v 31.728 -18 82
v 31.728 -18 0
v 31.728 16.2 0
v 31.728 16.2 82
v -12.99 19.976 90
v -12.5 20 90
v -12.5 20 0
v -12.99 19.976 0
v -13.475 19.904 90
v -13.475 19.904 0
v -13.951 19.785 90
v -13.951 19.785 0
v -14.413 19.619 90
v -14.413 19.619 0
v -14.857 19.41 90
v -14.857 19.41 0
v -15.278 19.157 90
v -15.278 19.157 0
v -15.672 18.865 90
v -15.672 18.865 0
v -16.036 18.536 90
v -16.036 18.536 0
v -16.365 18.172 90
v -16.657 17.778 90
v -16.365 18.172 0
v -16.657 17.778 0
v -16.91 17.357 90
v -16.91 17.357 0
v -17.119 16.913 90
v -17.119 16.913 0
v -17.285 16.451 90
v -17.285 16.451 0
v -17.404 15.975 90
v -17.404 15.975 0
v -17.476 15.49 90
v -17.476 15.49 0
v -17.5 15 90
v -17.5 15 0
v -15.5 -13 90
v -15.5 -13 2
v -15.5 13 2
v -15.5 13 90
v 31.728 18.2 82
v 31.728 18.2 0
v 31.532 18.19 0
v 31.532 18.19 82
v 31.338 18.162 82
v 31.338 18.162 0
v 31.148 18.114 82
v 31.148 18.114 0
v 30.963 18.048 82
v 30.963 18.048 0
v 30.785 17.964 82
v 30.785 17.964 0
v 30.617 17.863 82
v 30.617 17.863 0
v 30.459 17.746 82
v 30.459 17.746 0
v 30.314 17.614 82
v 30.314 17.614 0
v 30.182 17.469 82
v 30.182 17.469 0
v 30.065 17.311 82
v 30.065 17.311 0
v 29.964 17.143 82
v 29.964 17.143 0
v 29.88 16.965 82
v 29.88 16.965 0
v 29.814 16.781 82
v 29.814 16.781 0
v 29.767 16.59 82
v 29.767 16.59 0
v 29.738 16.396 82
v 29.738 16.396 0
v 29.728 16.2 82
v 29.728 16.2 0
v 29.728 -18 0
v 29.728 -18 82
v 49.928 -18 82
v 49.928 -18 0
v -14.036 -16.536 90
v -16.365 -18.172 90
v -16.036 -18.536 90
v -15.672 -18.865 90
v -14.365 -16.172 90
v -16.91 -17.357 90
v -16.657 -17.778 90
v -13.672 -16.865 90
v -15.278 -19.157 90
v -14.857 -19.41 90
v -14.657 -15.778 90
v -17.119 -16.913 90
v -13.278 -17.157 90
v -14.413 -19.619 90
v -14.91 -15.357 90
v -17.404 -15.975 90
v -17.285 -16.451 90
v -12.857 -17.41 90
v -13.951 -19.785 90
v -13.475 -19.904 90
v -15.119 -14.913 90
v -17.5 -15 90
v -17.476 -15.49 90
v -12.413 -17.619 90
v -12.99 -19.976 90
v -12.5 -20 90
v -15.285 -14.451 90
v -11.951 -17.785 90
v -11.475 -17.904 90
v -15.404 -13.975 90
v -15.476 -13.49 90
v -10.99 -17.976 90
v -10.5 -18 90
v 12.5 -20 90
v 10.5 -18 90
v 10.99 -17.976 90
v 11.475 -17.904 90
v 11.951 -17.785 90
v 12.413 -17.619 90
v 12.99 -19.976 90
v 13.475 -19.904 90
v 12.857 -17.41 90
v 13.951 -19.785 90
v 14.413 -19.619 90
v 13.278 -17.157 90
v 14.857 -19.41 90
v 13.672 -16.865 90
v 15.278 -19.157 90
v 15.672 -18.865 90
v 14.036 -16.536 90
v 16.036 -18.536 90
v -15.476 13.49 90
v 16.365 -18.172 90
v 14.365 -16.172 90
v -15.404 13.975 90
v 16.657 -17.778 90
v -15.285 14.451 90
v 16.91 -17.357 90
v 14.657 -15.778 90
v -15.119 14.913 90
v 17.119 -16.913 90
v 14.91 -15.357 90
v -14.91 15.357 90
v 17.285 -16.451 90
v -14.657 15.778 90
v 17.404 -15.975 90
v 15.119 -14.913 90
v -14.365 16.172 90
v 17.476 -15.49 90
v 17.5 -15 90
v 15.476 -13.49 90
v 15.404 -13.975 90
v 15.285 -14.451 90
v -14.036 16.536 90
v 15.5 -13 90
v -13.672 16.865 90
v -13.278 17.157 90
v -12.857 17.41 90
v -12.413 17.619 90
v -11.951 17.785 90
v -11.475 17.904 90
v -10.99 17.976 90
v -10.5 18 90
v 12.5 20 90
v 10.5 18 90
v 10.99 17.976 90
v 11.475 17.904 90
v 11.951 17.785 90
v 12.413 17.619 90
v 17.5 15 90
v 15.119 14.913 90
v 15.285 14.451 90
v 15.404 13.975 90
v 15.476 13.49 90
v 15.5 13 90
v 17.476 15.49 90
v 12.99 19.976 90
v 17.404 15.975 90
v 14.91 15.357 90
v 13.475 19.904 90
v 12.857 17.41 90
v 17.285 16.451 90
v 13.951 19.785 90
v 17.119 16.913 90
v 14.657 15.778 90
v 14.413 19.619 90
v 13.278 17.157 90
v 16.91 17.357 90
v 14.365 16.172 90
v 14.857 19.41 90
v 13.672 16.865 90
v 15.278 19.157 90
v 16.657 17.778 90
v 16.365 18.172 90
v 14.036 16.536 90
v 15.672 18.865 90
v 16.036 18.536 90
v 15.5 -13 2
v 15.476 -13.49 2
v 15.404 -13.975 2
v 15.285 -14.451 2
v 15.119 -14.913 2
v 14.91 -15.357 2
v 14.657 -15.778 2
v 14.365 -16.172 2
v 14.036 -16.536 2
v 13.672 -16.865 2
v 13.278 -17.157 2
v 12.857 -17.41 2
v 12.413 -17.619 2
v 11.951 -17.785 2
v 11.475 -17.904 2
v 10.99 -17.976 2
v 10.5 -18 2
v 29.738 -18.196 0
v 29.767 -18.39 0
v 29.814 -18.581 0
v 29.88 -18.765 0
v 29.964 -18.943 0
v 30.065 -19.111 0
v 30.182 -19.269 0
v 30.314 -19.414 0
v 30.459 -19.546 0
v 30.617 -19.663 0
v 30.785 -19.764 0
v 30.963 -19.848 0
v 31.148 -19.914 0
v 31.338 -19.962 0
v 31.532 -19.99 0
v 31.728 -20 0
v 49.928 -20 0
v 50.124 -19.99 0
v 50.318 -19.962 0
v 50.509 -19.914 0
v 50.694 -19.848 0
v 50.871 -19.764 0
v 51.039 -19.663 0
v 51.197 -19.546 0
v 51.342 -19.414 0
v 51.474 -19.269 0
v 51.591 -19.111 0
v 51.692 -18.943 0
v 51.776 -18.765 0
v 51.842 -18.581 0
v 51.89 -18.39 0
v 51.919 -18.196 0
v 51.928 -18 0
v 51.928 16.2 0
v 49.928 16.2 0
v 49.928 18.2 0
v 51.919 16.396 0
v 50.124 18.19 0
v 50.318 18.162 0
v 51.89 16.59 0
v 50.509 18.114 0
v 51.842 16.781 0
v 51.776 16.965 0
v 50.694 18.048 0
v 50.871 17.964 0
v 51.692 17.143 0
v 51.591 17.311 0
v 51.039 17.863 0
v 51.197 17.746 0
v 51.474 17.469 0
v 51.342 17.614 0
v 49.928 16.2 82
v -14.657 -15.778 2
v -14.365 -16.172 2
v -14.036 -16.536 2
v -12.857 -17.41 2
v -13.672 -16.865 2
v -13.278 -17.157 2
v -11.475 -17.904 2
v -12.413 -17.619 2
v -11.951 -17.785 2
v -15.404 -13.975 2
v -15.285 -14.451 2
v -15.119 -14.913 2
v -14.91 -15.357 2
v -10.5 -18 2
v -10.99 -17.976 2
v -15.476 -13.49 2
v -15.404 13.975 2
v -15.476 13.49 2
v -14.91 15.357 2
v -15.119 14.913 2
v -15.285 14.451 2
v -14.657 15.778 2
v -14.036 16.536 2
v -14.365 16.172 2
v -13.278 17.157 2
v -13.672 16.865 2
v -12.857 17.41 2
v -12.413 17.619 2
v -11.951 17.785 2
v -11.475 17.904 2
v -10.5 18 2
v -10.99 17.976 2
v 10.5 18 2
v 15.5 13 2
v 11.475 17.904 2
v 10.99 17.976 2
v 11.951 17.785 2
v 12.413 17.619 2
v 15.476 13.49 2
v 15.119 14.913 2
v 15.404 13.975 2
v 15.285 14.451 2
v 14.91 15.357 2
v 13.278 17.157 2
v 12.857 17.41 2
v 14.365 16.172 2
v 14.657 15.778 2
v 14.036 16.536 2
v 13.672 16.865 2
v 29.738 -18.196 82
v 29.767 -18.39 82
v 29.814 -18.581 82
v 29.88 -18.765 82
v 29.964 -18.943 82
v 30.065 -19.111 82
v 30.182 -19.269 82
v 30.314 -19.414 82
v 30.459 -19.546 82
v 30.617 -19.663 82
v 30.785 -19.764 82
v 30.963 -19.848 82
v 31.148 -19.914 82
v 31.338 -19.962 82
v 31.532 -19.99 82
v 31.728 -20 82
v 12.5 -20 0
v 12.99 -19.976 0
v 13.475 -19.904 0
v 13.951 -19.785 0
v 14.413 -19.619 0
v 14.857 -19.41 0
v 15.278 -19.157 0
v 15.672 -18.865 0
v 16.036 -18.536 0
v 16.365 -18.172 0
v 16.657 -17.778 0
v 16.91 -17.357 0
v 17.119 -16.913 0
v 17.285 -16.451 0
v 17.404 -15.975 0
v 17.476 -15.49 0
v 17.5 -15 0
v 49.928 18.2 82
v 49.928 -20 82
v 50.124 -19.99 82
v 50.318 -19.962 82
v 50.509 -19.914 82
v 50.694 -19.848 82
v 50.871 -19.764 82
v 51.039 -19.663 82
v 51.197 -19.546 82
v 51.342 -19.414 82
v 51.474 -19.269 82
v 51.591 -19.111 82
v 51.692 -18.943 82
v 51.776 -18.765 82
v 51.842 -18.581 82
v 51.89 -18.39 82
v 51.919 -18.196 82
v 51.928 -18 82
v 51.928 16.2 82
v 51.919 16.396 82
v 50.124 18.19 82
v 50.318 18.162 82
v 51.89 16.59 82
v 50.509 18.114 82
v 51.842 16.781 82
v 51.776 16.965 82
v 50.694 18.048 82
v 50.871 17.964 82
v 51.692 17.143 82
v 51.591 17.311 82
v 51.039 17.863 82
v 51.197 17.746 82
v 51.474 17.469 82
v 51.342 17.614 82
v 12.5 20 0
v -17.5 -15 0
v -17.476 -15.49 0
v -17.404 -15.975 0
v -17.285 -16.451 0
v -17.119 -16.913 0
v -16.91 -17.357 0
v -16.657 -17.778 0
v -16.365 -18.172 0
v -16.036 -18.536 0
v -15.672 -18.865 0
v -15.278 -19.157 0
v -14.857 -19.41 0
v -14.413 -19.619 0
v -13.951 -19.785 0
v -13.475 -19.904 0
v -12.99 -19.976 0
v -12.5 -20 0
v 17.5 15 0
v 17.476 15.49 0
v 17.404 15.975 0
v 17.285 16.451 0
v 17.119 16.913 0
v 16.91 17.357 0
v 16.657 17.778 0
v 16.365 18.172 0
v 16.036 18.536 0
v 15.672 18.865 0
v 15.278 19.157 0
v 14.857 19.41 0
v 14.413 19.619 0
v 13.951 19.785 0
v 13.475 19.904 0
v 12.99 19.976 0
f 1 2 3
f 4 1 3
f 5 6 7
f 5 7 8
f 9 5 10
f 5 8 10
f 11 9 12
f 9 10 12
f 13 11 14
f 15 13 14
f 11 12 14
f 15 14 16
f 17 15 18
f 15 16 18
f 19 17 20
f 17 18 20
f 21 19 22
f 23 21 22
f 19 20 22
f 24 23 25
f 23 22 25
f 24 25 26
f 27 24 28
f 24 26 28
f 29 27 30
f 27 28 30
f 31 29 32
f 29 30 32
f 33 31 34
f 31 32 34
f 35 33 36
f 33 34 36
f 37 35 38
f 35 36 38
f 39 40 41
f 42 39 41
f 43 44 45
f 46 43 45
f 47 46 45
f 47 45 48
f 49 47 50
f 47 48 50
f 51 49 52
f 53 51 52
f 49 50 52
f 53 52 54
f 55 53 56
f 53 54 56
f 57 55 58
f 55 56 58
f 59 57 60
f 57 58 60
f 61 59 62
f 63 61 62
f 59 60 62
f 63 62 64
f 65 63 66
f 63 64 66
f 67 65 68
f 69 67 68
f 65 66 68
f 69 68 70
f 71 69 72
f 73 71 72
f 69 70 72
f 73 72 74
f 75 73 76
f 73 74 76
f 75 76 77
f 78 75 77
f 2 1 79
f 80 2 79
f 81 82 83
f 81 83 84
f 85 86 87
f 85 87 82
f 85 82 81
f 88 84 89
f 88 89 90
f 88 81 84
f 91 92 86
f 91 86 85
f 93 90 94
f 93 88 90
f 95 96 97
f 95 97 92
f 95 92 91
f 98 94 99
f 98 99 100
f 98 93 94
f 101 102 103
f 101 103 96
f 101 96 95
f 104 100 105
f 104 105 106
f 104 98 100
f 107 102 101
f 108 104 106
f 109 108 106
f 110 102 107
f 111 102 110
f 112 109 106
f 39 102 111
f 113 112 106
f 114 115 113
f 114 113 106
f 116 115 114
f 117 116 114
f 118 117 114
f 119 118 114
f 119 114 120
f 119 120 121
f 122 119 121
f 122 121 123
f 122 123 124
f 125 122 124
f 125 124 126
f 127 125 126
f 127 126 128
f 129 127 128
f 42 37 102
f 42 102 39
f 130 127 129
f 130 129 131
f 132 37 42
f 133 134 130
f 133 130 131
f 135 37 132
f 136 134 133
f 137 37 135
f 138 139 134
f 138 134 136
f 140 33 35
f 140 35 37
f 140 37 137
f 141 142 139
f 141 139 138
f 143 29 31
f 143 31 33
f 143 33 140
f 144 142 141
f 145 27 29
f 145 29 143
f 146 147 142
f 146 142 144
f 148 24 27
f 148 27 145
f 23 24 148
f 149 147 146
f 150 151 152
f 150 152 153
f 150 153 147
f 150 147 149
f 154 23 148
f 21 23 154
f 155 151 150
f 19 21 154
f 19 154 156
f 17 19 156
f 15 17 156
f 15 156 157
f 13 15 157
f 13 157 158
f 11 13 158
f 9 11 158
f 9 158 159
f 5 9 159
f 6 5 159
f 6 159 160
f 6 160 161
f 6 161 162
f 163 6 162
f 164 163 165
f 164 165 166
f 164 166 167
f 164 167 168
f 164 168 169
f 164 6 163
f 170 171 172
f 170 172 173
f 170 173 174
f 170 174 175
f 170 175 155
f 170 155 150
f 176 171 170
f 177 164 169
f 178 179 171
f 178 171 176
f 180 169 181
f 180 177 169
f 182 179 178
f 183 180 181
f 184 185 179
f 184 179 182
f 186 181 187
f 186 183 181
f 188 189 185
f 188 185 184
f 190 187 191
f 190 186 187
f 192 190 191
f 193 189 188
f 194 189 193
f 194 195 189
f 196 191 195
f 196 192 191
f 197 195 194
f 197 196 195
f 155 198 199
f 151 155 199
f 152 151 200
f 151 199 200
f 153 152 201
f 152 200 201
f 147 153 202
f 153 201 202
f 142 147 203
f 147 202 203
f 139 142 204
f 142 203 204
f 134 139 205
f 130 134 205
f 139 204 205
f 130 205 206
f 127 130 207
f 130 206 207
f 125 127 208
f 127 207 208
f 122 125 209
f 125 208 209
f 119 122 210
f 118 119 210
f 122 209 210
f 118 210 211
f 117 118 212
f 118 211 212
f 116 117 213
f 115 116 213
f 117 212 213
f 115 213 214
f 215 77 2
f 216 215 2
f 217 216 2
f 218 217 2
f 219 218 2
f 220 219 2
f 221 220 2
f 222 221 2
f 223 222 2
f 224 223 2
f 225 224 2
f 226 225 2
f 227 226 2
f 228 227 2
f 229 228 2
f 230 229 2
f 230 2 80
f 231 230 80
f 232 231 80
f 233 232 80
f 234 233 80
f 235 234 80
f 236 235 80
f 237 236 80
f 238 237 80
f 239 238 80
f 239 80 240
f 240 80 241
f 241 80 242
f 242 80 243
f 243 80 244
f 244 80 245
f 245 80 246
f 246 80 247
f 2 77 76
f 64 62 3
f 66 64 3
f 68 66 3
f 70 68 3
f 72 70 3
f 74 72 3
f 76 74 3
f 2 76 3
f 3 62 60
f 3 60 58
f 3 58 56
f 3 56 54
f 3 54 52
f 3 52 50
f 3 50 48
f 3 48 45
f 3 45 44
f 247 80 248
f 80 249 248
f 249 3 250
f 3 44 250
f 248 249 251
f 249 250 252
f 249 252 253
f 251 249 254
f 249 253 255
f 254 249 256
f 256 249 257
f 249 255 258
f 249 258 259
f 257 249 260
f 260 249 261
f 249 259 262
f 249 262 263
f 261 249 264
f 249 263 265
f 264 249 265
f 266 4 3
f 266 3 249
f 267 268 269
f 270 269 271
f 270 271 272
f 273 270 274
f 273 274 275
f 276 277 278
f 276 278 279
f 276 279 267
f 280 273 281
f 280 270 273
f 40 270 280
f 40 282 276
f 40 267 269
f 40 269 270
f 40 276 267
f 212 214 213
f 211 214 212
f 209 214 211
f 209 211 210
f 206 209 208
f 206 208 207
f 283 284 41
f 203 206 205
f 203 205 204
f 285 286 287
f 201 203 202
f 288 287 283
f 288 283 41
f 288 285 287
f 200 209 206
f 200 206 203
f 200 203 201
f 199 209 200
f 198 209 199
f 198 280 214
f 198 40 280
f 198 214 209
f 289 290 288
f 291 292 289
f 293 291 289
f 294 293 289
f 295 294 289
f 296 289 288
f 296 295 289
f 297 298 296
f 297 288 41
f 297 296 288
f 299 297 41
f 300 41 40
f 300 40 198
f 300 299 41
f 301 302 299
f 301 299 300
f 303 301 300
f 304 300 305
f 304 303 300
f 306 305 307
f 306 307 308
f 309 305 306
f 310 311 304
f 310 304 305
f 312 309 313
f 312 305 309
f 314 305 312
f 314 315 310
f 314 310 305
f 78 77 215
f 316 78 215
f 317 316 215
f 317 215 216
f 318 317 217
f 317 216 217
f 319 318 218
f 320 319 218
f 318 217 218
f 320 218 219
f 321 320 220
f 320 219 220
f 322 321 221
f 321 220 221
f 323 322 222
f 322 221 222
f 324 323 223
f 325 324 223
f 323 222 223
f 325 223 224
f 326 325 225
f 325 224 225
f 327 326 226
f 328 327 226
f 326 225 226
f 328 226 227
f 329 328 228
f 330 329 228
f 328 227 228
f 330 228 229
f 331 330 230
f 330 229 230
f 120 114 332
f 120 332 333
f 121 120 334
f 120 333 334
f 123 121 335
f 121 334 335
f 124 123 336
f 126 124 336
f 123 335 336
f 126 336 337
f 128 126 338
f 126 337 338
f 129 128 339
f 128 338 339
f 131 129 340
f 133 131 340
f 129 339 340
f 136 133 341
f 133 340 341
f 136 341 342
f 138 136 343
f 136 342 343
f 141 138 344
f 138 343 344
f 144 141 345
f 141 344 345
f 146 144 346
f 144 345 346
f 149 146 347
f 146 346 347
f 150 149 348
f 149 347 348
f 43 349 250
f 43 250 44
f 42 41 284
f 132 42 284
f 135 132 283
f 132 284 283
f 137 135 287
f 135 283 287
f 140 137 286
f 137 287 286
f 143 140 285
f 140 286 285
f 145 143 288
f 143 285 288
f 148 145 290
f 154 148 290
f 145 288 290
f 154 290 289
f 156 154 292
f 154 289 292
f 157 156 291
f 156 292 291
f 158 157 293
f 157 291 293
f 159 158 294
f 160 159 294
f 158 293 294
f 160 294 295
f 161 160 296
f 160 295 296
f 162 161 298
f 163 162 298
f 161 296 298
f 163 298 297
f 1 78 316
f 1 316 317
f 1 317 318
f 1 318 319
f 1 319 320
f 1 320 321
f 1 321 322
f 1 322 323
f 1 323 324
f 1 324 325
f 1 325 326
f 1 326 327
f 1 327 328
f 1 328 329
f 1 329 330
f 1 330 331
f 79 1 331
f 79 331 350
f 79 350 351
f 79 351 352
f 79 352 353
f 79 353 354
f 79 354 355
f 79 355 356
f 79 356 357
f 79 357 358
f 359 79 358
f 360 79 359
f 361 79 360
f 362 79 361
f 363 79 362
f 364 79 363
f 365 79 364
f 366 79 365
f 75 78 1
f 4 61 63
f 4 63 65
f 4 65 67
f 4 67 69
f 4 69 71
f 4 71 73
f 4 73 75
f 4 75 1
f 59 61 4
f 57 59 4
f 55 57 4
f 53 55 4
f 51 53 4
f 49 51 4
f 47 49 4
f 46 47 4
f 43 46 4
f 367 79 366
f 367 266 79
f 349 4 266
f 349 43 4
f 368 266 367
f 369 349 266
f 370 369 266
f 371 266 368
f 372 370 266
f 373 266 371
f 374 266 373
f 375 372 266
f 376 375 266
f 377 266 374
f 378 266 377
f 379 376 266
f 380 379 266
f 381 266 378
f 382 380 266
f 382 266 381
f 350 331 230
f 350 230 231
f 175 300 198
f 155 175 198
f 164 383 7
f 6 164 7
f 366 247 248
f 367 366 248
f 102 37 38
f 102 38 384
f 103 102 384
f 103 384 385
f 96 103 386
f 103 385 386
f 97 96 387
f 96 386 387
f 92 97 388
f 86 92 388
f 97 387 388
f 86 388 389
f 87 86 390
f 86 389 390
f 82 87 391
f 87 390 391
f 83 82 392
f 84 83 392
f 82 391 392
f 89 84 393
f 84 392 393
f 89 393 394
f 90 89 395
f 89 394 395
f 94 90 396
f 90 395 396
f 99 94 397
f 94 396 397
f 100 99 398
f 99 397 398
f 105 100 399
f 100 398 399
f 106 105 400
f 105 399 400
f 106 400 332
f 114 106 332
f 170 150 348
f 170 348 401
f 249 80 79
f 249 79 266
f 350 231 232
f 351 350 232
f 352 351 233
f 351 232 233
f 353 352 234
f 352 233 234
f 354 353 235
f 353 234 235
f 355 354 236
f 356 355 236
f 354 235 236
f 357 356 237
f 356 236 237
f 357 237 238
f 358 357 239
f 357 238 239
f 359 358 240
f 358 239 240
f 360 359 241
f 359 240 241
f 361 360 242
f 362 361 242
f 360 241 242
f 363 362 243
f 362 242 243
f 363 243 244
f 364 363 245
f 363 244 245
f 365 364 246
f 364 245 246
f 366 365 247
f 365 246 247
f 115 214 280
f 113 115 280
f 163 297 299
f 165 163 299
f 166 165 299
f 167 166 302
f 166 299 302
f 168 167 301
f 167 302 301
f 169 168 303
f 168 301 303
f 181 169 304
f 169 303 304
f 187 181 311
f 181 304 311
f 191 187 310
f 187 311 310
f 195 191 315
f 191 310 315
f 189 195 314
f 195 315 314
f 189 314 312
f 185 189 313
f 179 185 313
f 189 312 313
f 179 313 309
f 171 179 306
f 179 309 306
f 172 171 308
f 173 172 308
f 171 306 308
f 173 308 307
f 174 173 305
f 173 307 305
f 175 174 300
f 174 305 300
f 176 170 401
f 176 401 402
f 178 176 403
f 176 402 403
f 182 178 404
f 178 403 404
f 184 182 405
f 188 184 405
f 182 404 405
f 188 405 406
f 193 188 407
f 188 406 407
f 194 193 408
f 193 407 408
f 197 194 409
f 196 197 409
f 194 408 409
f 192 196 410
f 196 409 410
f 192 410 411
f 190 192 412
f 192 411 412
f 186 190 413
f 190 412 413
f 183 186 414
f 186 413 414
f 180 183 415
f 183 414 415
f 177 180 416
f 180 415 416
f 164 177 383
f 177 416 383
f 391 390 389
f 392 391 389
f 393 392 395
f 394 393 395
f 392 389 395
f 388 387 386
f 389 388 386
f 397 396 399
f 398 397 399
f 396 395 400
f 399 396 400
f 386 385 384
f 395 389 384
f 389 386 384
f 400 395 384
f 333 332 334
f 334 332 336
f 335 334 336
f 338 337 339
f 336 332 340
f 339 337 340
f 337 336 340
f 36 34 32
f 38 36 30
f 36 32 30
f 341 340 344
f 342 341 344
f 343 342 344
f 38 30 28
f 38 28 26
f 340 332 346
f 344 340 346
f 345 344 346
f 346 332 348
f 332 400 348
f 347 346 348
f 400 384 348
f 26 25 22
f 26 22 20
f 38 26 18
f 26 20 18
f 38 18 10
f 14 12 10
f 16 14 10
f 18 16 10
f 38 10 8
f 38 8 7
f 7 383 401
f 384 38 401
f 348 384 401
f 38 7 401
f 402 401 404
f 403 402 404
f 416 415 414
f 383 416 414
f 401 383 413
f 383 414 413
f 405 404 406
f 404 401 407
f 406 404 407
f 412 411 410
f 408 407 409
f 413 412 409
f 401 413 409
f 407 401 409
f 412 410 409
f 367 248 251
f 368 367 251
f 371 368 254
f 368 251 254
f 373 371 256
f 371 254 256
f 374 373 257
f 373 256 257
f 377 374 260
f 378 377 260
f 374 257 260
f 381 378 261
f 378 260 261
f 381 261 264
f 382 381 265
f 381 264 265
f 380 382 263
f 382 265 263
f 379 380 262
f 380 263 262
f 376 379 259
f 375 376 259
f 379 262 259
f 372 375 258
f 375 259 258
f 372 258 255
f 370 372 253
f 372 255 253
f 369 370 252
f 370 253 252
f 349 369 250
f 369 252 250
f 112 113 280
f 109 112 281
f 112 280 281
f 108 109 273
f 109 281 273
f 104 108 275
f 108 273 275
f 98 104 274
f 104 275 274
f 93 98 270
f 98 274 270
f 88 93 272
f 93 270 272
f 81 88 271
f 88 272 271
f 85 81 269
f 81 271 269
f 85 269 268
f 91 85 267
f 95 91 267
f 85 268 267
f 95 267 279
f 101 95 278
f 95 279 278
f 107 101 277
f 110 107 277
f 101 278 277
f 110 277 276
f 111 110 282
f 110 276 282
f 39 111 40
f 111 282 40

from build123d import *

# Parameters (mm, degrees)
F1_DEPTH = 90
F2_DEPTH = 2
F3_W     = 18.2
F3_H     = 34.2
F4_DEPTH = 82


with BuildPart() as f1:
    # F0 (on Top) → F1 (new body)
    with BuildSketch(Plane.XY):
        with BuildLine():
            ThreePointArc((17.5, 15), (16.035534, 18.535534), (12.5, 20))
            Line((12.5, 20), (-12.5, 20))
            ThreePointArc((-12.5, 20), (-16.035534, 18.535534), (-17.5, 15))
            Line((-17.5, 15), (-17.5, -15))
            ThreePointArc((-17.5, -15), (-16.035534, -18.535534), (-12.5, -20))
            Line((-12.5, -20), (12.5, -20))
            ThreePointArc((12.5, -20), (16.035534, -18.535534), (17.5, -15))
            Line((17.5, -15), (17.5, 15))
        make_face()
        with BuildLine():
            Line((-15.5, -13), (-15.5, 13))
            ThreePointArc((-15.5, 13), (-14.035534, 16.535534), (-10.5, 18))
            Line((-10.5, 18), (10.5, 18))
            ThreePointArc((10.5, 18), (14.035534, 16.535534), (15.5, 13))
            Line((15.5, 13), (15.5, -13))
            ThreePointArc((15.5, -13), (14.035534, -16.535534), (10.5, -18))
            Line((10.5, -18), (-10.5, -18))
            ThreePointArc((-10.5, -18), (-14.035534, -16.535534), (-15.5, -13))
        make_face(mode=Mode.SUBTRACT)
    extrude(amount=F1_DEPTH)

    # F0 (on Top) → F2 (join)
    with BuildSketch(Plane.XY):
        with BuildLine():
            ThreePointArc((-10.5, 18), (-14.035534, 16.535534), (-15.5, 13))
            Line((-15.5, 13), (-15.5, -13))
            ThreePointArc((-15.5, -13), (-14.035534, -16.535534), (-10.5, -18))
            Line((-10.5, -18), (10.5, -18))
            ThreePointArc((10.5, -18), (14.035534, -16.535534), (15.5, -13))
            Line((15.5, -13), (15.5, 13))
            ThreePointArc((15.5, 13), (14.035534, 16.535534), (10.5, 18))
            Line((10.5, 18), (-10.5, 18))
        make_face()
    extrude(amount=F2_DEPTH)


with BuildPart() as f4:
    # F3 (on Top) → F4 (new body)
    with BuildSketch(Plane.XY):
        with BuildLine():
            Line((49.928209, 18.2), (31.728209, 18.2))
            ThreePointArc((31.728209, 18.2), (30.313995, 17.614214), (29.728209, 16.2))
            Line((29.728209, 16.2), (29.728209, -18))
            ThreePointArc((29.728209, -18), (30.313995, -19.414214), (31.728209, -20))
            Line((31.728209, -20), (49.928209, -20))
            ThreePointArc((49.928209, -20), (51.342422, -19.414214), (51.928209, -18))
            Line((51.928209, -18), (51.928209, 16.2))
            ThreePointArc((51.928209, 16.2), (51.342422, 17.614214), (49.928209, 18.2))
        make_face()
        with Locations((40.828209, -0.9)):
            Rectangle(F3_W, F3_H, mode=Mode.SUBTRACT)
    extrude(amount=F4_DEPTH)


solid = Compound([f1.part, f4.part])
